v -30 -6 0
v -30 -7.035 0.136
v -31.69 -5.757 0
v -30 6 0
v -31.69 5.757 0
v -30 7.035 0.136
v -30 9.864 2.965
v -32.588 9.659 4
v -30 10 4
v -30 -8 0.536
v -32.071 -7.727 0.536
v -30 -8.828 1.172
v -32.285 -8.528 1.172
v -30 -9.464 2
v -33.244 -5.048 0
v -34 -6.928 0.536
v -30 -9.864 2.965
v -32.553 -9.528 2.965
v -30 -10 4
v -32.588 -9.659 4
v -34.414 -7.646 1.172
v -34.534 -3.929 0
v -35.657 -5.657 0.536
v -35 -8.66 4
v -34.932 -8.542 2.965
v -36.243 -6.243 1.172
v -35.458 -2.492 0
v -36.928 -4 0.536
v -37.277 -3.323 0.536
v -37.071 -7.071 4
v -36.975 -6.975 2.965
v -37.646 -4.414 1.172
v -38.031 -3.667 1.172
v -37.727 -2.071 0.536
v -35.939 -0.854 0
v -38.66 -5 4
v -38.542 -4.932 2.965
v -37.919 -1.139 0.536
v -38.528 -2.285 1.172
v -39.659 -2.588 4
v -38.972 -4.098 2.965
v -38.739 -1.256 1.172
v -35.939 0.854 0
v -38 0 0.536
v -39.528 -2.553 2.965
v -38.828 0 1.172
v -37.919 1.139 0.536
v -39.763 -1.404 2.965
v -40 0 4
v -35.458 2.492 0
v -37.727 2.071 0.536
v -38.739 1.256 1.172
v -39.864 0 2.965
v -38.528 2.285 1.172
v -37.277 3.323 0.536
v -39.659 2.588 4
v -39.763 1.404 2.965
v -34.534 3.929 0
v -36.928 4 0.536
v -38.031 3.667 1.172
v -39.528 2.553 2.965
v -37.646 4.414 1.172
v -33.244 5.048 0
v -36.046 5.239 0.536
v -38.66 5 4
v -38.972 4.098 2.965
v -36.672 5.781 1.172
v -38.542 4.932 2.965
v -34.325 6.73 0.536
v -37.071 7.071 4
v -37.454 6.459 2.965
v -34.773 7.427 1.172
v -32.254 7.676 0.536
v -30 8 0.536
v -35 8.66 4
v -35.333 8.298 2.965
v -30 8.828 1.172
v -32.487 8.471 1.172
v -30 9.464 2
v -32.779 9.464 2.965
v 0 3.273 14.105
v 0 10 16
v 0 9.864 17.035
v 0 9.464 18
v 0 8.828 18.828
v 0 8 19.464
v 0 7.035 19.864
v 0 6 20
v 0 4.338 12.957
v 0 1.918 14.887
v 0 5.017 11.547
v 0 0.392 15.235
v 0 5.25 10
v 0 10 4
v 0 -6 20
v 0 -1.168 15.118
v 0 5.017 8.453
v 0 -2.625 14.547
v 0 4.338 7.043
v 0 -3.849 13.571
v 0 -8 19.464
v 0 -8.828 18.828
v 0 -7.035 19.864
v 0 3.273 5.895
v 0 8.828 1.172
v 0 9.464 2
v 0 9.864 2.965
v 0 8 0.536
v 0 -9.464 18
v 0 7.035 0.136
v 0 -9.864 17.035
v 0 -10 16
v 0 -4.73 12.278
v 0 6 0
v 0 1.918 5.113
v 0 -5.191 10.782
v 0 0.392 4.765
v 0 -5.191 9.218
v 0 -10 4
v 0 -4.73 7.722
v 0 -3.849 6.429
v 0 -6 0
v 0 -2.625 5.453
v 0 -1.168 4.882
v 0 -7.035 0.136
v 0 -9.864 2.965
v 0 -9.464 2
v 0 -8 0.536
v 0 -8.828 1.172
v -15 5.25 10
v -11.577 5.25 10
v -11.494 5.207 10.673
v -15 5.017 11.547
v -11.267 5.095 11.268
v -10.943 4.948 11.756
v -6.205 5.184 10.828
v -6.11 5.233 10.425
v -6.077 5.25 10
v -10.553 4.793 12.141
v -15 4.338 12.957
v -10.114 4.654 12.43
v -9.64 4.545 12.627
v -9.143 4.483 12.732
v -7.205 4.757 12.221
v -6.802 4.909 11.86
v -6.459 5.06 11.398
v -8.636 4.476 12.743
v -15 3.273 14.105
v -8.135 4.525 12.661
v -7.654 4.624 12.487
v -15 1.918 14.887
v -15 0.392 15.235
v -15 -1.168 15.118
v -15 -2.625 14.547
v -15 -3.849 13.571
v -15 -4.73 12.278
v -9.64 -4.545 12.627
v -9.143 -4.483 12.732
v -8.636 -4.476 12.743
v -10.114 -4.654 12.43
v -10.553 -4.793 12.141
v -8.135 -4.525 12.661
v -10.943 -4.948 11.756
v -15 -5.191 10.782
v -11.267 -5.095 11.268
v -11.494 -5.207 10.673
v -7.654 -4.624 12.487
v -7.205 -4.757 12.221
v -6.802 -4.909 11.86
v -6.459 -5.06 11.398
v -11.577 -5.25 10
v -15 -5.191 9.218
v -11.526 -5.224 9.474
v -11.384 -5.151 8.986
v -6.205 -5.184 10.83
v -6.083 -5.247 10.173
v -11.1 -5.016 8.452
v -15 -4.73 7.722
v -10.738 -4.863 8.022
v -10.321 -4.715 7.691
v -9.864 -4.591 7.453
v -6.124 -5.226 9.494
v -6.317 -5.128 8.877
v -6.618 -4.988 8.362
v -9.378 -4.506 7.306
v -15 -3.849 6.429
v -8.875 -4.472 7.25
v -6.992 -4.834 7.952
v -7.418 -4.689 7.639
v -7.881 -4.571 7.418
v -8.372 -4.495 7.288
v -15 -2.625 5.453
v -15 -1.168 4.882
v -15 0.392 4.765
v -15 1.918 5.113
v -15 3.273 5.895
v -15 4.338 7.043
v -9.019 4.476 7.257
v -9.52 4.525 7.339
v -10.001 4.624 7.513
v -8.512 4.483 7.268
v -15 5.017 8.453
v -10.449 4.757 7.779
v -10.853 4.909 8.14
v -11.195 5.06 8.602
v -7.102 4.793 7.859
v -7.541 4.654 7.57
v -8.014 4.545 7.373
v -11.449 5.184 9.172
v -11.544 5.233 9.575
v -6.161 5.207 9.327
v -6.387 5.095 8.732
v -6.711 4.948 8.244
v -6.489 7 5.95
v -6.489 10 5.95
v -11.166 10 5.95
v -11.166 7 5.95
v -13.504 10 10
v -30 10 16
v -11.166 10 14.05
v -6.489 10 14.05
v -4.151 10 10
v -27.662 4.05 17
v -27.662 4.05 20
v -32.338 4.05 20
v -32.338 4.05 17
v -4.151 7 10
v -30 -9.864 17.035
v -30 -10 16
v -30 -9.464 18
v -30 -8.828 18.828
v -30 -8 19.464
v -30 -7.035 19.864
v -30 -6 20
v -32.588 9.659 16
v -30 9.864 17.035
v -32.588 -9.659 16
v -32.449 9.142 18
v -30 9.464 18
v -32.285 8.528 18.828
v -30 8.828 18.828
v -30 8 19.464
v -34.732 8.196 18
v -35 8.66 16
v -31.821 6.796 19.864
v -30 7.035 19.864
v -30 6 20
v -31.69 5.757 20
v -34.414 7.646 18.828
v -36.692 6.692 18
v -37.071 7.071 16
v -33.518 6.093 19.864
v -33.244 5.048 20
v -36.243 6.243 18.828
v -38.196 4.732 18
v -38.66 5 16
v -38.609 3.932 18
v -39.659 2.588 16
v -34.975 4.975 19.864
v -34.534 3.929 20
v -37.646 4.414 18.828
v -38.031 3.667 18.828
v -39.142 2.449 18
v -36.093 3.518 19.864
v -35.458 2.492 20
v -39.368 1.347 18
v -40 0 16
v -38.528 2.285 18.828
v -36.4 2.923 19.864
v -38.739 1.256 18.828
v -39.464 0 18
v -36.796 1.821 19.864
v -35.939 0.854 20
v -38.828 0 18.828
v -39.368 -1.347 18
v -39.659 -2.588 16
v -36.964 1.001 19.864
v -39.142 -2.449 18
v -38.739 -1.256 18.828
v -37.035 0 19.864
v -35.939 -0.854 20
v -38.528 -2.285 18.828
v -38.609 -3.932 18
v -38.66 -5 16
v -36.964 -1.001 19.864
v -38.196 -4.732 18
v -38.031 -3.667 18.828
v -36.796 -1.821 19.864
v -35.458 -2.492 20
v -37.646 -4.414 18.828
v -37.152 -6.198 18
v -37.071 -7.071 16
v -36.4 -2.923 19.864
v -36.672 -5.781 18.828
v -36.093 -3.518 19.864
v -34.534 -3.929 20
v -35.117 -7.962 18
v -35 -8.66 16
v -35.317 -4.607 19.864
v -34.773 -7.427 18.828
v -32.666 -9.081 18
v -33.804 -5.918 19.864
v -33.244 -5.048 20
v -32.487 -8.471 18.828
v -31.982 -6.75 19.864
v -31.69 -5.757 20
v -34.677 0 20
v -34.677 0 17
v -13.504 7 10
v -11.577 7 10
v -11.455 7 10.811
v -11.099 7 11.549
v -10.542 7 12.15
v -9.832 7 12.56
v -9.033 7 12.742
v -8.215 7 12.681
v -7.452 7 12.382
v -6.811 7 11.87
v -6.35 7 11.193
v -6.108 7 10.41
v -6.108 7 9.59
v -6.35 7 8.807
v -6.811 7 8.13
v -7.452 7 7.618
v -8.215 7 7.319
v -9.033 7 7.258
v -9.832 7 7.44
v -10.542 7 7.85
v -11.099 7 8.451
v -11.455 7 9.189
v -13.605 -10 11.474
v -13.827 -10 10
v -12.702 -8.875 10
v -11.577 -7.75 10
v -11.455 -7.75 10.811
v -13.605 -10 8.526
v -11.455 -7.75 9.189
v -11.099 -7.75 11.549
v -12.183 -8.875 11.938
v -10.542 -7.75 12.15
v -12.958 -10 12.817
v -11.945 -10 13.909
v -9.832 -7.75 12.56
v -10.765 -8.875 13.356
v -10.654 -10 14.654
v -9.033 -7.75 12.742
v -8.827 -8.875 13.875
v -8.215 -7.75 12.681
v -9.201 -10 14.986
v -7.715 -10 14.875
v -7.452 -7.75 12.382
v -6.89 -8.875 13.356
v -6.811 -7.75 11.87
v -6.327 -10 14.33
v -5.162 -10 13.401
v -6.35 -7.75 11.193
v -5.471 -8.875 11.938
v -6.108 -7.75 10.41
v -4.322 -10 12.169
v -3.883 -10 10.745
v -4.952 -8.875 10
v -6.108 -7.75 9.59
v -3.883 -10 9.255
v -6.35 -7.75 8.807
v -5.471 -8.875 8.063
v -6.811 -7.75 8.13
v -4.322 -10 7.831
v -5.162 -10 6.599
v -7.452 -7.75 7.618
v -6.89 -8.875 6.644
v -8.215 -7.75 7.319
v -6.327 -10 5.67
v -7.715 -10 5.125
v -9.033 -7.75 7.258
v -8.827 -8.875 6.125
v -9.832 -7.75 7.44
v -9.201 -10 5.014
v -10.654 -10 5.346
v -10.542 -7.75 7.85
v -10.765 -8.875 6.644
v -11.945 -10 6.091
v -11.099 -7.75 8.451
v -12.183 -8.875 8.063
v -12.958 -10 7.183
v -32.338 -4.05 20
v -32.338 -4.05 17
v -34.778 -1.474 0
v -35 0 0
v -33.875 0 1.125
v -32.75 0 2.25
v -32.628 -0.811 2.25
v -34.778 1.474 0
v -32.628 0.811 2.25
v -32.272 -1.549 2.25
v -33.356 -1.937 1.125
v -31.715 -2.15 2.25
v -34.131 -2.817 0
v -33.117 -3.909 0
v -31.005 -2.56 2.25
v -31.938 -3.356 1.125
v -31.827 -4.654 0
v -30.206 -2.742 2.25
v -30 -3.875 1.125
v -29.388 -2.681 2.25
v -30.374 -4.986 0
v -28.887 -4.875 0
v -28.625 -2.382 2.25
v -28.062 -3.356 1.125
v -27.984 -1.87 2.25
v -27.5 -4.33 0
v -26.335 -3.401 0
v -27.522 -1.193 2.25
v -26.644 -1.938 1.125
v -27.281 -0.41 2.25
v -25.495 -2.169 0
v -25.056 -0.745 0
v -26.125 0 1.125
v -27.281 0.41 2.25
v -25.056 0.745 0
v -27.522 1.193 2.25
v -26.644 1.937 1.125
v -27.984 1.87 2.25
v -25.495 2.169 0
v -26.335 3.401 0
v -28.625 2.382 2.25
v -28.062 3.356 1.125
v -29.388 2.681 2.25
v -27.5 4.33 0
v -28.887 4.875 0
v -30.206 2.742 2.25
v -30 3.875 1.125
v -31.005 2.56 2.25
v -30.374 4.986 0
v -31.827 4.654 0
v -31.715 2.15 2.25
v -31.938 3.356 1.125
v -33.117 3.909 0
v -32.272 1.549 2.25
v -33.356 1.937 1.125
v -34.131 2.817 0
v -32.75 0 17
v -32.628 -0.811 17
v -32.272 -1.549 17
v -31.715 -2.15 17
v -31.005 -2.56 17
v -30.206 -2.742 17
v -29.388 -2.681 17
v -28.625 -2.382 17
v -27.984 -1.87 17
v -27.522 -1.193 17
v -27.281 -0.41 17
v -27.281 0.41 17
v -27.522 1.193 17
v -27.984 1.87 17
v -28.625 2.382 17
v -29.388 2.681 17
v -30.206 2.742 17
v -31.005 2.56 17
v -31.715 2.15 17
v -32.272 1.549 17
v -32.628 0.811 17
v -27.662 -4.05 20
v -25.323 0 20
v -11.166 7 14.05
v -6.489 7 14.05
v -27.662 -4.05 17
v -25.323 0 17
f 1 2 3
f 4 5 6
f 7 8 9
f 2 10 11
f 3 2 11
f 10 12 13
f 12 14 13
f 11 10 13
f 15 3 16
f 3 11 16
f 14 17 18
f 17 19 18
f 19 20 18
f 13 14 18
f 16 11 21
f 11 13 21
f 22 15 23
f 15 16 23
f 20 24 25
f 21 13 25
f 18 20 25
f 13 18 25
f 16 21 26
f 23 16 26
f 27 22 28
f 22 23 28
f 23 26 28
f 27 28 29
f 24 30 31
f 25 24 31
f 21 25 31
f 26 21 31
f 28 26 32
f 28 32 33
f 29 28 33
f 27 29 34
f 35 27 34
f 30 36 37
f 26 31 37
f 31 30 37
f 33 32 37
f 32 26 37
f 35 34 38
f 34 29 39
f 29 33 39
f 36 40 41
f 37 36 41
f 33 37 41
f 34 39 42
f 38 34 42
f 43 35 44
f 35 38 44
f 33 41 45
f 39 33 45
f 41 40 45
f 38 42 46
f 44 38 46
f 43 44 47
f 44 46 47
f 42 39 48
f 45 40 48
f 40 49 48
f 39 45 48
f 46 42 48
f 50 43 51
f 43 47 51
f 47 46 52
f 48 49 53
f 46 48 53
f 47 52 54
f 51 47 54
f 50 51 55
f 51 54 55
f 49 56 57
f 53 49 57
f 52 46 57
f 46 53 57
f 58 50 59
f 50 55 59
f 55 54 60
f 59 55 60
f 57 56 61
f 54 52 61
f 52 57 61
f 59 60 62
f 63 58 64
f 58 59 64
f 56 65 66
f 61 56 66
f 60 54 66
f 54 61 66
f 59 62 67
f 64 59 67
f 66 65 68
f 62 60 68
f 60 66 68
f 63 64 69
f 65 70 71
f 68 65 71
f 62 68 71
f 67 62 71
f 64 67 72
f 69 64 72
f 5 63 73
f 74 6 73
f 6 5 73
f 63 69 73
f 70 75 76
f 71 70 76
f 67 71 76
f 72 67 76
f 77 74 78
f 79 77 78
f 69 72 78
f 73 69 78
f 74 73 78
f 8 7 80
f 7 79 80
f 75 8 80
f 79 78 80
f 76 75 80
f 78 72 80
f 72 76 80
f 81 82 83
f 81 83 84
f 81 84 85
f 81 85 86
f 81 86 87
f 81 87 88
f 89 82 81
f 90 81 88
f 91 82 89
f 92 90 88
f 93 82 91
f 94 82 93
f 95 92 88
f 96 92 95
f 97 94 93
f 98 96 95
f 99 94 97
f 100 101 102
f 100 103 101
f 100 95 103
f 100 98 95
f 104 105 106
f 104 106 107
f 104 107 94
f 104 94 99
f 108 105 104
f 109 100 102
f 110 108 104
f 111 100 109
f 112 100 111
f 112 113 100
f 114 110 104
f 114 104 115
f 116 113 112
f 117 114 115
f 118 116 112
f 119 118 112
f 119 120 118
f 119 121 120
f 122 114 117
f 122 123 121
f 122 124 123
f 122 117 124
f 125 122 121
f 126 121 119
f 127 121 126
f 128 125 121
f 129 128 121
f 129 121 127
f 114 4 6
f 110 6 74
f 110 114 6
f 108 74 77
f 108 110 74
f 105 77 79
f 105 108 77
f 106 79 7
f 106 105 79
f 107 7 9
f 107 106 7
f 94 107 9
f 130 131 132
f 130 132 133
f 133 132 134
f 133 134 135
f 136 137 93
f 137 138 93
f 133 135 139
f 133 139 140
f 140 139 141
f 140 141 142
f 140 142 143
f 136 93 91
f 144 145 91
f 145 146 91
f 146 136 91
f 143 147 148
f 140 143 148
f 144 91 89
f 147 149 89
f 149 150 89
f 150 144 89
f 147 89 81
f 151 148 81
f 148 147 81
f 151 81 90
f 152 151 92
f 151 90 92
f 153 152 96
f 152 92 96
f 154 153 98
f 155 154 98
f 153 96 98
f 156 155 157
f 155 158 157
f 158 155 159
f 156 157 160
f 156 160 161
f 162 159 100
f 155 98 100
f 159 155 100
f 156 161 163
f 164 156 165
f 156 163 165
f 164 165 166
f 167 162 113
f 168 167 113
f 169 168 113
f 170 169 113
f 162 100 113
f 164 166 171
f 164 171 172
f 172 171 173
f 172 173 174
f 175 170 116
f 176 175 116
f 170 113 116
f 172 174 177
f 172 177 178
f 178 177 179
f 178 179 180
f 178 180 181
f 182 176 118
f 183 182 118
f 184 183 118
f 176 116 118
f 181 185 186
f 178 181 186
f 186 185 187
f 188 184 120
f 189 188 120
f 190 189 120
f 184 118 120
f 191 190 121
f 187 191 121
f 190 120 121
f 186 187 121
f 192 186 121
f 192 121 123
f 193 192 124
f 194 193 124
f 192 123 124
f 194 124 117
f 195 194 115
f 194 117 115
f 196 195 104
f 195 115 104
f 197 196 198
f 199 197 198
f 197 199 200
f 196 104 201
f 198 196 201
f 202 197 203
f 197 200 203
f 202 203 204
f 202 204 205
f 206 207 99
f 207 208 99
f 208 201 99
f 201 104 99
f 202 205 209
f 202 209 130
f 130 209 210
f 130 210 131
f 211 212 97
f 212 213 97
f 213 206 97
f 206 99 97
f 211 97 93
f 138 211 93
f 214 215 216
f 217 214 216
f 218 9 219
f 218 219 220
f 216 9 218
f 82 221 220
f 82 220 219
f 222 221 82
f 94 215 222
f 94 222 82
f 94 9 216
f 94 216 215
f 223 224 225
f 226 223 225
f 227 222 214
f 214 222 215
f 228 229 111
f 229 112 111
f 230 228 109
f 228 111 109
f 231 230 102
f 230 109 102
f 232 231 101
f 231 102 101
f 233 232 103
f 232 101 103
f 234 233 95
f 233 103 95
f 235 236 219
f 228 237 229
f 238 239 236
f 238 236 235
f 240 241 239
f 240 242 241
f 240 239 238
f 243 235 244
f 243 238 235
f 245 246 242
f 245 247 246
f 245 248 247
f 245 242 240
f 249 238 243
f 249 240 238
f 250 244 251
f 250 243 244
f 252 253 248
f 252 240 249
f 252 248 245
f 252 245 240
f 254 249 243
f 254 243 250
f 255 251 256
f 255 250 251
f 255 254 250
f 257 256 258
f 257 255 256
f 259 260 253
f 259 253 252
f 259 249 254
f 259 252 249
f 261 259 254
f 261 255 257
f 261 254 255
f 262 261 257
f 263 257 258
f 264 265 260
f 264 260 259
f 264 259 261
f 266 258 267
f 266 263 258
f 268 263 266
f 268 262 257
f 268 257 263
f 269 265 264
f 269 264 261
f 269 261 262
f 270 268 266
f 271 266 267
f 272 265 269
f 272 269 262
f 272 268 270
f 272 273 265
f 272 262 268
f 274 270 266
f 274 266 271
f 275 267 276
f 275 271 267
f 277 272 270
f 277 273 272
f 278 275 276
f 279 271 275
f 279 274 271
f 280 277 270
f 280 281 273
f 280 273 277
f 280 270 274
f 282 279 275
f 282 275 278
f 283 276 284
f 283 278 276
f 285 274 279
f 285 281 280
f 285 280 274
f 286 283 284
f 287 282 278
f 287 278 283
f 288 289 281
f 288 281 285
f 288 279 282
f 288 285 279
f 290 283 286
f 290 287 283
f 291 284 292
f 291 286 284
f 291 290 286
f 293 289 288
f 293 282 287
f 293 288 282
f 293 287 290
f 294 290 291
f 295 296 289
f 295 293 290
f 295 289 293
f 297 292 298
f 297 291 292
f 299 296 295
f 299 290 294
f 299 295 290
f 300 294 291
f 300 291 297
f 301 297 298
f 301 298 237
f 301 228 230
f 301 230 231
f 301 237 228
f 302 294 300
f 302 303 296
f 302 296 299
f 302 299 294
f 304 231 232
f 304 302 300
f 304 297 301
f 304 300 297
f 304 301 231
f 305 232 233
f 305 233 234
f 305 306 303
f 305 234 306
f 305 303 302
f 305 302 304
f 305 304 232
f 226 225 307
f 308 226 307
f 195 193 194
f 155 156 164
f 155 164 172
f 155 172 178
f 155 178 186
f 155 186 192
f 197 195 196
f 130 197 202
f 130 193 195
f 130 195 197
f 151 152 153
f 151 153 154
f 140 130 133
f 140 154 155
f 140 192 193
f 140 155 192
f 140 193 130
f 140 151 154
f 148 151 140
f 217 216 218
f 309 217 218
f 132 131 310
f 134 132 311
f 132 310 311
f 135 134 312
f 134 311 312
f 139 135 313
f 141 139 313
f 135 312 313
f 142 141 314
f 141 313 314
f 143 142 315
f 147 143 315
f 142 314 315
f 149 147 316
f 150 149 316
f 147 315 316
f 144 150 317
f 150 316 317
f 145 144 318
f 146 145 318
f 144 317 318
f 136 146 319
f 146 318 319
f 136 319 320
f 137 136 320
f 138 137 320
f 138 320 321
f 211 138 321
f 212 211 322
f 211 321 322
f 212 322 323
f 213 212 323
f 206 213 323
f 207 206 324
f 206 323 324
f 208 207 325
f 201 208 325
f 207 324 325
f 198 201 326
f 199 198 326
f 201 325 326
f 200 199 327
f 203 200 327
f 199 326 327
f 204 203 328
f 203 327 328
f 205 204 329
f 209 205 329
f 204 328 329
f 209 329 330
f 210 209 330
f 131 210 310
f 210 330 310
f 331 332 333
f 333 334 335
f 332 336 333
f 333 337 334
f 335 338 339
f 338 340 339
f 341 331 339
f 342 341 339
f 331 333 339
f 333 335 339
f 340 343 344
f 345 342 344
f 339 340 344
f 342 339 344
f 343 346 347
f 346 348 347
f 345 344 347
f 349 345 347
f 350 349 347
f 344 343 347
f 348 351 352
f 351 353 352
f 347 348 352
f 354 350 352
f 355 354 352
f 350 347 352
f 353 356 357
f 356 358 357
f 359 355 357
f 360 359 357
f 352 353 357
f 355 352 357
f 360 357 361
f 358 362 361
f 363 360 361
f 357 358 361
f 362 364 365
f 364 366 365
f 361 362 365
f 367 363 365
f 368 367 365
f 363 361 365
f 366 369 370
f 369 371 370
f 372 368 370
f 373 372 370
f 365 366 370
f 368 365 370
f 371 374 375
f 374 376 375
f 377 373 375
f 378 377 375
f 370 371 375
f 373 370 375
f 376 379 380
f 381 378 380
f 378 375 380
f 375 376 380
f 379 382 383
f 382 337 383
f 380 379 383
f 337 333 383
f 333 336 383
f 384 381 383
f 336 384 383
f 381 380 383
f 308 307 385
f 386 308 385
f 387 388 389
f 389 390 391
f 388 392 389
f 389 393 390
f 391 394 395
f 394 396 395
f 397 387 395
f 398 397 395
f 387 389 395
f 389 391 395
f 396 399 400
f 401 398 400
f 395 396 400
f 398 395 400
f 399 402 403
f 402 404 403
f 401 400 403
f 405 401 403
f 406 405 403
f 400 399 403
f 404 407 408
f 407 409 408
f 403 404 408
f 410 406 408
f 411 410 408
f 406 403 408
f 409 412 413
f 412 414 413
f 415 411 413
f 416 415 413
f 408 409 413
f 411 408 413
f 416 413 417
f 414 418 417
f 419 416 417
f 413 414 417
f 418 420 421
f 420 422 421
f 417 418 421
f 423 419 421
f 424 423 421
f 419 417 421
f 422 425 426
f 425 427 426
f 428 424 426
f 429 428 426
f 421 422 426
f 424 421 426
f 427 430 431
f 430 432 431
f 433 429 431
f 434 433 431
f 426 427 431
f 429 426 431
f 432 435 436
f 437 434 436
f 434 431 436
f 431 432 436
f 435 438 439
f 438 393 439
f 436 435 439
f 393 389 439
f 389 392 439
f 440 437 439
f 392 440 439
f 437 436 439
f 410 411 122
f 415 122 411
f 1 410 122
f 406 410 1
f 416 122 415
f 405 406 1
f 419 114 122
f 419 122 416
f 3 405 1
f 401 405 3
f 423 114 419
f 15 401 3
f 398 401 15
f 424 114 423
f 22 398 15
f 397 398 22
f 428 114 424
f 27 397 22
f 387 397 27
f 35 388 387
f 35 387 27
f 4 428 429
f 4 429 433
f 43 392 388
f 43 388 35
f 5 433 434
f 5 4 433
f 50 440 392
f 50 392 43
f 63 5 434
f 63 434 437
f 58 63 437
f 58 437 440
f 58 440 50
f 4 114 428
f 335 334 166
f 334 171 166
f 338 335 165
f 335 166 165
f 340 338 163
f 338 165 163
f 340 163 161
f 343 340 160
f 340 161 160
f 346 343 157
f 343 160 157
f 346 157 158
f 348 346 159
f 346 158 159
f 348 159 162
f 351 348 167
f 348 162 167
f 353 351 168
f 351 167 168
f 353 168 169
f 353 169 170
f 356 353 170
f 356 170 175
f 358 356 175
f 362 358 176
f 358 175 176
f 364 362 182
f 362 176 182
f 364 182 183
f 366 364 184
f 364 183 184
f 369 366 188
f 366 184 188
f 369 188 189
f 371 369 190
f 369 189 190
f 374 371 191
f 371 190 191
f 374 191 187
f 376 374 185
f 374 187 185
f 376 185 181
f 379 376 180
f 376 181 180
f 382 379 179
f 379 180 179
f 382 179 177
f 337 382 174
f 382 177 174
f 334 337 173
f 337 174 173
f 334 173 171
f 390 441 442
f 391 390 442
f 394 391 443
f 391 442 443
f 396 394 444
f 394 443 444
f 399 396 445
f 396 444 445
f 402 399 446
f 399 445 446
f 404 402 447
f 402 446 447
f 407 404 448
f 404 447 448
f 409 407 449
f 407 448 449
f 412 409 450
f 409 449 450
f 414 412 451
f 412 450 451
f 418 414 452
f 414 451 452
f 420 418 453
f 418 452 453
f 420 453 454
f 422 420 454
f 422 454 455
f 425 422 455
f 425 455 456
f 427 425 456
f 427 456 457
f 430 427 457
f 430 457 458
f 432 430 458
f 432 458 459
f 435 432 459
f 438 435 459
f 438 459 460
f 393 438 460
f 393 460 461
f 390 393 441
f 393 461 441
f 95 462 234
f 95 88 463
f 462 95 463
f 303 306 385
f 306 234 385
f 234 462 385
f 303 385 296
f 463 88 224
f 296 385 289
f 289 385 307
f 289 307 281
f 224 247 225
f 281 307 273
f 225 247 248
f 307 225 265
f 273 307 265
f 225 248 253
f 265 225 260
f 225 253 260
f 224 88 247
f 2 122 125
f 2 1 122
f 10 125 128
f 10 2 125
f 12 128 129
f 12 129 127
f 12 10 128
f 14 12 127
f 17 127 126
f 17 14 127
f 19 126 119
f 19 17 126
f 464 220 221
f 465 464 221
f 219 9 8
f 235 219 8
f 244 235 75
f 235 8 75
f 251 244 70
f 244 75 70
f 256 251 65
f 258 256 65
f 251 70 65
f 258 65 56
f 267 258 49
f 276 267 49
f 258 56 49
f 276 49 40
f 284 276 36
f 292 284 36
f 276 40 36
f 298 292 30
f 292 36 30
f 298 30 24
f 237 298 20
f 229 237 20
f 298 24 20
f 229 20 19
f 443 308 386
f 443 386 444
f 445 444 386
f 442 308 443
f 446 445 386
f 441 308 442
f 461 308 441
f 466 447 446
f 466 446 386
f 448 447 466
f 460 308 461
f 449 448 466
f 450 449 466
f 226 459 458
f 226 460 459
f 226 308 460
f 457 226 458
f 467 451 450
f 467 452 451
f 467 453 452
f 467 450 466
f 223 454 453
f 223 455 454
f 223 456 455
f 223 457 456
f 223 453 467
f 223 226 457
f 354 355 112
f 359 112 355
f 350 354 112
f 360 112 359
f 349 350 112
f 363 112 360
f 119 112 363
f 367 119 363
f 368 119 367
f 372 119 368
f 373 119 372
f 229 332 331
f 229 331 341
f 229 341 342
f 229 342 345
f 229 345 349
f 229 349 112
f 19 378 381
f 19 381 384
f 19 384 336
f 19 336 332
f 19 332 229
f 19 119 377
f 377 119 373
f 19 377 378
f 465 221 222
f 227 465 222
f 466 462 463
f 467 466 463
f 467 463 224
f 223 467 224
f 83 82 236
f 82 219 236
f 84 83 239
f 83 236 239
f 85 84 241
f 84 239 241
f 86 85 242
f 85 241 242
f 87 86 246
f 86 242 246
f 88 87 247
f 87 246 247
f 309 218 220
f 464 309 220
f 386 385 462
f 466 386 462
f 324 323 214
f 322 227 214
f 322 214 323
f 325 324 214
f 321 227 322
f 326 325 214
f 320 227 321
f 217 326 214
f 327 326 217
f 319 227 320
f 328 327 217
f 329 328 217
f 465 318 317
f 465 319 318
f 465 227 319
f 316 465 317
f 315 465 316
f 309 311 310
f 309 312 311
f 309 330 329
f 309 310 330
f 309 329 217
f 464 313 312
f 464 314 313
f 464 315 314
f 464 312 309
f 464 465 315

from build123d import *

# Parameters (mm, degrees)
PAD_DEPTH           = 20
SKETCH001_R         = 5.25
POCKET_DEPTH        = 15
HOLE_D              = 5.5
HOLE_CSINK_D        = 10
HOLE_CSINK_ANGLE    = 90
POCKET001_DEPTH     = 3
FILLET_R            = 4
HOLE001_D           = 5.5
HOLE001_DEPTH       = 25
HOLE001_CSINK_D     = 10
HOLE001_CSINK_ANGLE = 90
POCKET002_DEPTH     = 3


with BuildPart() as part:
    # Sketch → Pad (new body)
    with BuildSketch(Plane.XY):
        with BuildLine():
            Line((-30, 10), (0, 10))
            Line((0, 10), (0, -10))
            Line((0, -10), (-30, -10))
            ThreePointArc((-30, 10), (-40, 0), (-30, -10))
        make_face()
    extrude(amount=PAD_DEPTH)

    # Sketch001 (on Face2 of Pad) → Pocket (cut)
    with BuildSketch(Plane.YZ):
        with Locations((0, 10)):
            Circle(SKETCH001_R)
    extrude(amount=-POCKET_DEPTH, mode=Mode.SUBTRACT)

    # Hole (through all)
    with Locations(Plane.XZ.offset(10)):
        with Locations((-8.827239, 10)):
            CounterSinkHole(HOLE_D / 2, HOLE_CSINK_D / 2, counter_sink_angle=HOLE_CSINK_ANGLE)

    # Sketch004 (on Face1 of Hole) → Pocket001 (cut)
    with BuildSketch(Plane(origin=(0, 10, 0), x_dir=(-1, 0, 0), z_dir=(0, 1, 0))):
        Polygon((11.165508, 5.95), (13.503776, 10), (11.165508, 14.05), (6.48897, 14.05), (4.150702, 10), (6.48897, 5.95), align=None)
    extrude(amount=-POCKET001_DEPTH, mode=Mode.SUBTRACT)

    # Fillet
    fillet_edges = [part.edges().sort_by_distance(p)[0] for p in [
        (-15, -10, 0),
        (-40, 0, 0),
        (-15, 10, 0),
        (-40, 0, 20),
        (-15, 10, 20),
    ]]
    fillet(fillet_edges, radius=FILLET_R)

    # Hole001
    with Locations(Plane(origin=(0, 0, 0), x_dir=(1, 0, 0), z_dir=(0, 0, -1))):
        with Locations((-30, 0)):
            CounterSinkHole(HOLE001_D / 2, HOLE001_CSINK_D / 2, depth=HOLE001_DEPTH, counter_sink_angle=HOLE001_CSINK_ANGLE)

    # Sketch006 (on Face16 of Hole001) → Pocket002 (cut)
    with BuildSketch(Plane.XY.offset(20)):
        Polygon((-27.661731, -4.05), (-25.323463, 0), (-27.661731, 4.05), (-32.338269, 4.05), (-34.676537, 0), (-32.338269, -4.05), align=None)
    extrude(amount=-POCKET002_DEPTH, mode=Mode.SUBTRACT)


solid = part.part
